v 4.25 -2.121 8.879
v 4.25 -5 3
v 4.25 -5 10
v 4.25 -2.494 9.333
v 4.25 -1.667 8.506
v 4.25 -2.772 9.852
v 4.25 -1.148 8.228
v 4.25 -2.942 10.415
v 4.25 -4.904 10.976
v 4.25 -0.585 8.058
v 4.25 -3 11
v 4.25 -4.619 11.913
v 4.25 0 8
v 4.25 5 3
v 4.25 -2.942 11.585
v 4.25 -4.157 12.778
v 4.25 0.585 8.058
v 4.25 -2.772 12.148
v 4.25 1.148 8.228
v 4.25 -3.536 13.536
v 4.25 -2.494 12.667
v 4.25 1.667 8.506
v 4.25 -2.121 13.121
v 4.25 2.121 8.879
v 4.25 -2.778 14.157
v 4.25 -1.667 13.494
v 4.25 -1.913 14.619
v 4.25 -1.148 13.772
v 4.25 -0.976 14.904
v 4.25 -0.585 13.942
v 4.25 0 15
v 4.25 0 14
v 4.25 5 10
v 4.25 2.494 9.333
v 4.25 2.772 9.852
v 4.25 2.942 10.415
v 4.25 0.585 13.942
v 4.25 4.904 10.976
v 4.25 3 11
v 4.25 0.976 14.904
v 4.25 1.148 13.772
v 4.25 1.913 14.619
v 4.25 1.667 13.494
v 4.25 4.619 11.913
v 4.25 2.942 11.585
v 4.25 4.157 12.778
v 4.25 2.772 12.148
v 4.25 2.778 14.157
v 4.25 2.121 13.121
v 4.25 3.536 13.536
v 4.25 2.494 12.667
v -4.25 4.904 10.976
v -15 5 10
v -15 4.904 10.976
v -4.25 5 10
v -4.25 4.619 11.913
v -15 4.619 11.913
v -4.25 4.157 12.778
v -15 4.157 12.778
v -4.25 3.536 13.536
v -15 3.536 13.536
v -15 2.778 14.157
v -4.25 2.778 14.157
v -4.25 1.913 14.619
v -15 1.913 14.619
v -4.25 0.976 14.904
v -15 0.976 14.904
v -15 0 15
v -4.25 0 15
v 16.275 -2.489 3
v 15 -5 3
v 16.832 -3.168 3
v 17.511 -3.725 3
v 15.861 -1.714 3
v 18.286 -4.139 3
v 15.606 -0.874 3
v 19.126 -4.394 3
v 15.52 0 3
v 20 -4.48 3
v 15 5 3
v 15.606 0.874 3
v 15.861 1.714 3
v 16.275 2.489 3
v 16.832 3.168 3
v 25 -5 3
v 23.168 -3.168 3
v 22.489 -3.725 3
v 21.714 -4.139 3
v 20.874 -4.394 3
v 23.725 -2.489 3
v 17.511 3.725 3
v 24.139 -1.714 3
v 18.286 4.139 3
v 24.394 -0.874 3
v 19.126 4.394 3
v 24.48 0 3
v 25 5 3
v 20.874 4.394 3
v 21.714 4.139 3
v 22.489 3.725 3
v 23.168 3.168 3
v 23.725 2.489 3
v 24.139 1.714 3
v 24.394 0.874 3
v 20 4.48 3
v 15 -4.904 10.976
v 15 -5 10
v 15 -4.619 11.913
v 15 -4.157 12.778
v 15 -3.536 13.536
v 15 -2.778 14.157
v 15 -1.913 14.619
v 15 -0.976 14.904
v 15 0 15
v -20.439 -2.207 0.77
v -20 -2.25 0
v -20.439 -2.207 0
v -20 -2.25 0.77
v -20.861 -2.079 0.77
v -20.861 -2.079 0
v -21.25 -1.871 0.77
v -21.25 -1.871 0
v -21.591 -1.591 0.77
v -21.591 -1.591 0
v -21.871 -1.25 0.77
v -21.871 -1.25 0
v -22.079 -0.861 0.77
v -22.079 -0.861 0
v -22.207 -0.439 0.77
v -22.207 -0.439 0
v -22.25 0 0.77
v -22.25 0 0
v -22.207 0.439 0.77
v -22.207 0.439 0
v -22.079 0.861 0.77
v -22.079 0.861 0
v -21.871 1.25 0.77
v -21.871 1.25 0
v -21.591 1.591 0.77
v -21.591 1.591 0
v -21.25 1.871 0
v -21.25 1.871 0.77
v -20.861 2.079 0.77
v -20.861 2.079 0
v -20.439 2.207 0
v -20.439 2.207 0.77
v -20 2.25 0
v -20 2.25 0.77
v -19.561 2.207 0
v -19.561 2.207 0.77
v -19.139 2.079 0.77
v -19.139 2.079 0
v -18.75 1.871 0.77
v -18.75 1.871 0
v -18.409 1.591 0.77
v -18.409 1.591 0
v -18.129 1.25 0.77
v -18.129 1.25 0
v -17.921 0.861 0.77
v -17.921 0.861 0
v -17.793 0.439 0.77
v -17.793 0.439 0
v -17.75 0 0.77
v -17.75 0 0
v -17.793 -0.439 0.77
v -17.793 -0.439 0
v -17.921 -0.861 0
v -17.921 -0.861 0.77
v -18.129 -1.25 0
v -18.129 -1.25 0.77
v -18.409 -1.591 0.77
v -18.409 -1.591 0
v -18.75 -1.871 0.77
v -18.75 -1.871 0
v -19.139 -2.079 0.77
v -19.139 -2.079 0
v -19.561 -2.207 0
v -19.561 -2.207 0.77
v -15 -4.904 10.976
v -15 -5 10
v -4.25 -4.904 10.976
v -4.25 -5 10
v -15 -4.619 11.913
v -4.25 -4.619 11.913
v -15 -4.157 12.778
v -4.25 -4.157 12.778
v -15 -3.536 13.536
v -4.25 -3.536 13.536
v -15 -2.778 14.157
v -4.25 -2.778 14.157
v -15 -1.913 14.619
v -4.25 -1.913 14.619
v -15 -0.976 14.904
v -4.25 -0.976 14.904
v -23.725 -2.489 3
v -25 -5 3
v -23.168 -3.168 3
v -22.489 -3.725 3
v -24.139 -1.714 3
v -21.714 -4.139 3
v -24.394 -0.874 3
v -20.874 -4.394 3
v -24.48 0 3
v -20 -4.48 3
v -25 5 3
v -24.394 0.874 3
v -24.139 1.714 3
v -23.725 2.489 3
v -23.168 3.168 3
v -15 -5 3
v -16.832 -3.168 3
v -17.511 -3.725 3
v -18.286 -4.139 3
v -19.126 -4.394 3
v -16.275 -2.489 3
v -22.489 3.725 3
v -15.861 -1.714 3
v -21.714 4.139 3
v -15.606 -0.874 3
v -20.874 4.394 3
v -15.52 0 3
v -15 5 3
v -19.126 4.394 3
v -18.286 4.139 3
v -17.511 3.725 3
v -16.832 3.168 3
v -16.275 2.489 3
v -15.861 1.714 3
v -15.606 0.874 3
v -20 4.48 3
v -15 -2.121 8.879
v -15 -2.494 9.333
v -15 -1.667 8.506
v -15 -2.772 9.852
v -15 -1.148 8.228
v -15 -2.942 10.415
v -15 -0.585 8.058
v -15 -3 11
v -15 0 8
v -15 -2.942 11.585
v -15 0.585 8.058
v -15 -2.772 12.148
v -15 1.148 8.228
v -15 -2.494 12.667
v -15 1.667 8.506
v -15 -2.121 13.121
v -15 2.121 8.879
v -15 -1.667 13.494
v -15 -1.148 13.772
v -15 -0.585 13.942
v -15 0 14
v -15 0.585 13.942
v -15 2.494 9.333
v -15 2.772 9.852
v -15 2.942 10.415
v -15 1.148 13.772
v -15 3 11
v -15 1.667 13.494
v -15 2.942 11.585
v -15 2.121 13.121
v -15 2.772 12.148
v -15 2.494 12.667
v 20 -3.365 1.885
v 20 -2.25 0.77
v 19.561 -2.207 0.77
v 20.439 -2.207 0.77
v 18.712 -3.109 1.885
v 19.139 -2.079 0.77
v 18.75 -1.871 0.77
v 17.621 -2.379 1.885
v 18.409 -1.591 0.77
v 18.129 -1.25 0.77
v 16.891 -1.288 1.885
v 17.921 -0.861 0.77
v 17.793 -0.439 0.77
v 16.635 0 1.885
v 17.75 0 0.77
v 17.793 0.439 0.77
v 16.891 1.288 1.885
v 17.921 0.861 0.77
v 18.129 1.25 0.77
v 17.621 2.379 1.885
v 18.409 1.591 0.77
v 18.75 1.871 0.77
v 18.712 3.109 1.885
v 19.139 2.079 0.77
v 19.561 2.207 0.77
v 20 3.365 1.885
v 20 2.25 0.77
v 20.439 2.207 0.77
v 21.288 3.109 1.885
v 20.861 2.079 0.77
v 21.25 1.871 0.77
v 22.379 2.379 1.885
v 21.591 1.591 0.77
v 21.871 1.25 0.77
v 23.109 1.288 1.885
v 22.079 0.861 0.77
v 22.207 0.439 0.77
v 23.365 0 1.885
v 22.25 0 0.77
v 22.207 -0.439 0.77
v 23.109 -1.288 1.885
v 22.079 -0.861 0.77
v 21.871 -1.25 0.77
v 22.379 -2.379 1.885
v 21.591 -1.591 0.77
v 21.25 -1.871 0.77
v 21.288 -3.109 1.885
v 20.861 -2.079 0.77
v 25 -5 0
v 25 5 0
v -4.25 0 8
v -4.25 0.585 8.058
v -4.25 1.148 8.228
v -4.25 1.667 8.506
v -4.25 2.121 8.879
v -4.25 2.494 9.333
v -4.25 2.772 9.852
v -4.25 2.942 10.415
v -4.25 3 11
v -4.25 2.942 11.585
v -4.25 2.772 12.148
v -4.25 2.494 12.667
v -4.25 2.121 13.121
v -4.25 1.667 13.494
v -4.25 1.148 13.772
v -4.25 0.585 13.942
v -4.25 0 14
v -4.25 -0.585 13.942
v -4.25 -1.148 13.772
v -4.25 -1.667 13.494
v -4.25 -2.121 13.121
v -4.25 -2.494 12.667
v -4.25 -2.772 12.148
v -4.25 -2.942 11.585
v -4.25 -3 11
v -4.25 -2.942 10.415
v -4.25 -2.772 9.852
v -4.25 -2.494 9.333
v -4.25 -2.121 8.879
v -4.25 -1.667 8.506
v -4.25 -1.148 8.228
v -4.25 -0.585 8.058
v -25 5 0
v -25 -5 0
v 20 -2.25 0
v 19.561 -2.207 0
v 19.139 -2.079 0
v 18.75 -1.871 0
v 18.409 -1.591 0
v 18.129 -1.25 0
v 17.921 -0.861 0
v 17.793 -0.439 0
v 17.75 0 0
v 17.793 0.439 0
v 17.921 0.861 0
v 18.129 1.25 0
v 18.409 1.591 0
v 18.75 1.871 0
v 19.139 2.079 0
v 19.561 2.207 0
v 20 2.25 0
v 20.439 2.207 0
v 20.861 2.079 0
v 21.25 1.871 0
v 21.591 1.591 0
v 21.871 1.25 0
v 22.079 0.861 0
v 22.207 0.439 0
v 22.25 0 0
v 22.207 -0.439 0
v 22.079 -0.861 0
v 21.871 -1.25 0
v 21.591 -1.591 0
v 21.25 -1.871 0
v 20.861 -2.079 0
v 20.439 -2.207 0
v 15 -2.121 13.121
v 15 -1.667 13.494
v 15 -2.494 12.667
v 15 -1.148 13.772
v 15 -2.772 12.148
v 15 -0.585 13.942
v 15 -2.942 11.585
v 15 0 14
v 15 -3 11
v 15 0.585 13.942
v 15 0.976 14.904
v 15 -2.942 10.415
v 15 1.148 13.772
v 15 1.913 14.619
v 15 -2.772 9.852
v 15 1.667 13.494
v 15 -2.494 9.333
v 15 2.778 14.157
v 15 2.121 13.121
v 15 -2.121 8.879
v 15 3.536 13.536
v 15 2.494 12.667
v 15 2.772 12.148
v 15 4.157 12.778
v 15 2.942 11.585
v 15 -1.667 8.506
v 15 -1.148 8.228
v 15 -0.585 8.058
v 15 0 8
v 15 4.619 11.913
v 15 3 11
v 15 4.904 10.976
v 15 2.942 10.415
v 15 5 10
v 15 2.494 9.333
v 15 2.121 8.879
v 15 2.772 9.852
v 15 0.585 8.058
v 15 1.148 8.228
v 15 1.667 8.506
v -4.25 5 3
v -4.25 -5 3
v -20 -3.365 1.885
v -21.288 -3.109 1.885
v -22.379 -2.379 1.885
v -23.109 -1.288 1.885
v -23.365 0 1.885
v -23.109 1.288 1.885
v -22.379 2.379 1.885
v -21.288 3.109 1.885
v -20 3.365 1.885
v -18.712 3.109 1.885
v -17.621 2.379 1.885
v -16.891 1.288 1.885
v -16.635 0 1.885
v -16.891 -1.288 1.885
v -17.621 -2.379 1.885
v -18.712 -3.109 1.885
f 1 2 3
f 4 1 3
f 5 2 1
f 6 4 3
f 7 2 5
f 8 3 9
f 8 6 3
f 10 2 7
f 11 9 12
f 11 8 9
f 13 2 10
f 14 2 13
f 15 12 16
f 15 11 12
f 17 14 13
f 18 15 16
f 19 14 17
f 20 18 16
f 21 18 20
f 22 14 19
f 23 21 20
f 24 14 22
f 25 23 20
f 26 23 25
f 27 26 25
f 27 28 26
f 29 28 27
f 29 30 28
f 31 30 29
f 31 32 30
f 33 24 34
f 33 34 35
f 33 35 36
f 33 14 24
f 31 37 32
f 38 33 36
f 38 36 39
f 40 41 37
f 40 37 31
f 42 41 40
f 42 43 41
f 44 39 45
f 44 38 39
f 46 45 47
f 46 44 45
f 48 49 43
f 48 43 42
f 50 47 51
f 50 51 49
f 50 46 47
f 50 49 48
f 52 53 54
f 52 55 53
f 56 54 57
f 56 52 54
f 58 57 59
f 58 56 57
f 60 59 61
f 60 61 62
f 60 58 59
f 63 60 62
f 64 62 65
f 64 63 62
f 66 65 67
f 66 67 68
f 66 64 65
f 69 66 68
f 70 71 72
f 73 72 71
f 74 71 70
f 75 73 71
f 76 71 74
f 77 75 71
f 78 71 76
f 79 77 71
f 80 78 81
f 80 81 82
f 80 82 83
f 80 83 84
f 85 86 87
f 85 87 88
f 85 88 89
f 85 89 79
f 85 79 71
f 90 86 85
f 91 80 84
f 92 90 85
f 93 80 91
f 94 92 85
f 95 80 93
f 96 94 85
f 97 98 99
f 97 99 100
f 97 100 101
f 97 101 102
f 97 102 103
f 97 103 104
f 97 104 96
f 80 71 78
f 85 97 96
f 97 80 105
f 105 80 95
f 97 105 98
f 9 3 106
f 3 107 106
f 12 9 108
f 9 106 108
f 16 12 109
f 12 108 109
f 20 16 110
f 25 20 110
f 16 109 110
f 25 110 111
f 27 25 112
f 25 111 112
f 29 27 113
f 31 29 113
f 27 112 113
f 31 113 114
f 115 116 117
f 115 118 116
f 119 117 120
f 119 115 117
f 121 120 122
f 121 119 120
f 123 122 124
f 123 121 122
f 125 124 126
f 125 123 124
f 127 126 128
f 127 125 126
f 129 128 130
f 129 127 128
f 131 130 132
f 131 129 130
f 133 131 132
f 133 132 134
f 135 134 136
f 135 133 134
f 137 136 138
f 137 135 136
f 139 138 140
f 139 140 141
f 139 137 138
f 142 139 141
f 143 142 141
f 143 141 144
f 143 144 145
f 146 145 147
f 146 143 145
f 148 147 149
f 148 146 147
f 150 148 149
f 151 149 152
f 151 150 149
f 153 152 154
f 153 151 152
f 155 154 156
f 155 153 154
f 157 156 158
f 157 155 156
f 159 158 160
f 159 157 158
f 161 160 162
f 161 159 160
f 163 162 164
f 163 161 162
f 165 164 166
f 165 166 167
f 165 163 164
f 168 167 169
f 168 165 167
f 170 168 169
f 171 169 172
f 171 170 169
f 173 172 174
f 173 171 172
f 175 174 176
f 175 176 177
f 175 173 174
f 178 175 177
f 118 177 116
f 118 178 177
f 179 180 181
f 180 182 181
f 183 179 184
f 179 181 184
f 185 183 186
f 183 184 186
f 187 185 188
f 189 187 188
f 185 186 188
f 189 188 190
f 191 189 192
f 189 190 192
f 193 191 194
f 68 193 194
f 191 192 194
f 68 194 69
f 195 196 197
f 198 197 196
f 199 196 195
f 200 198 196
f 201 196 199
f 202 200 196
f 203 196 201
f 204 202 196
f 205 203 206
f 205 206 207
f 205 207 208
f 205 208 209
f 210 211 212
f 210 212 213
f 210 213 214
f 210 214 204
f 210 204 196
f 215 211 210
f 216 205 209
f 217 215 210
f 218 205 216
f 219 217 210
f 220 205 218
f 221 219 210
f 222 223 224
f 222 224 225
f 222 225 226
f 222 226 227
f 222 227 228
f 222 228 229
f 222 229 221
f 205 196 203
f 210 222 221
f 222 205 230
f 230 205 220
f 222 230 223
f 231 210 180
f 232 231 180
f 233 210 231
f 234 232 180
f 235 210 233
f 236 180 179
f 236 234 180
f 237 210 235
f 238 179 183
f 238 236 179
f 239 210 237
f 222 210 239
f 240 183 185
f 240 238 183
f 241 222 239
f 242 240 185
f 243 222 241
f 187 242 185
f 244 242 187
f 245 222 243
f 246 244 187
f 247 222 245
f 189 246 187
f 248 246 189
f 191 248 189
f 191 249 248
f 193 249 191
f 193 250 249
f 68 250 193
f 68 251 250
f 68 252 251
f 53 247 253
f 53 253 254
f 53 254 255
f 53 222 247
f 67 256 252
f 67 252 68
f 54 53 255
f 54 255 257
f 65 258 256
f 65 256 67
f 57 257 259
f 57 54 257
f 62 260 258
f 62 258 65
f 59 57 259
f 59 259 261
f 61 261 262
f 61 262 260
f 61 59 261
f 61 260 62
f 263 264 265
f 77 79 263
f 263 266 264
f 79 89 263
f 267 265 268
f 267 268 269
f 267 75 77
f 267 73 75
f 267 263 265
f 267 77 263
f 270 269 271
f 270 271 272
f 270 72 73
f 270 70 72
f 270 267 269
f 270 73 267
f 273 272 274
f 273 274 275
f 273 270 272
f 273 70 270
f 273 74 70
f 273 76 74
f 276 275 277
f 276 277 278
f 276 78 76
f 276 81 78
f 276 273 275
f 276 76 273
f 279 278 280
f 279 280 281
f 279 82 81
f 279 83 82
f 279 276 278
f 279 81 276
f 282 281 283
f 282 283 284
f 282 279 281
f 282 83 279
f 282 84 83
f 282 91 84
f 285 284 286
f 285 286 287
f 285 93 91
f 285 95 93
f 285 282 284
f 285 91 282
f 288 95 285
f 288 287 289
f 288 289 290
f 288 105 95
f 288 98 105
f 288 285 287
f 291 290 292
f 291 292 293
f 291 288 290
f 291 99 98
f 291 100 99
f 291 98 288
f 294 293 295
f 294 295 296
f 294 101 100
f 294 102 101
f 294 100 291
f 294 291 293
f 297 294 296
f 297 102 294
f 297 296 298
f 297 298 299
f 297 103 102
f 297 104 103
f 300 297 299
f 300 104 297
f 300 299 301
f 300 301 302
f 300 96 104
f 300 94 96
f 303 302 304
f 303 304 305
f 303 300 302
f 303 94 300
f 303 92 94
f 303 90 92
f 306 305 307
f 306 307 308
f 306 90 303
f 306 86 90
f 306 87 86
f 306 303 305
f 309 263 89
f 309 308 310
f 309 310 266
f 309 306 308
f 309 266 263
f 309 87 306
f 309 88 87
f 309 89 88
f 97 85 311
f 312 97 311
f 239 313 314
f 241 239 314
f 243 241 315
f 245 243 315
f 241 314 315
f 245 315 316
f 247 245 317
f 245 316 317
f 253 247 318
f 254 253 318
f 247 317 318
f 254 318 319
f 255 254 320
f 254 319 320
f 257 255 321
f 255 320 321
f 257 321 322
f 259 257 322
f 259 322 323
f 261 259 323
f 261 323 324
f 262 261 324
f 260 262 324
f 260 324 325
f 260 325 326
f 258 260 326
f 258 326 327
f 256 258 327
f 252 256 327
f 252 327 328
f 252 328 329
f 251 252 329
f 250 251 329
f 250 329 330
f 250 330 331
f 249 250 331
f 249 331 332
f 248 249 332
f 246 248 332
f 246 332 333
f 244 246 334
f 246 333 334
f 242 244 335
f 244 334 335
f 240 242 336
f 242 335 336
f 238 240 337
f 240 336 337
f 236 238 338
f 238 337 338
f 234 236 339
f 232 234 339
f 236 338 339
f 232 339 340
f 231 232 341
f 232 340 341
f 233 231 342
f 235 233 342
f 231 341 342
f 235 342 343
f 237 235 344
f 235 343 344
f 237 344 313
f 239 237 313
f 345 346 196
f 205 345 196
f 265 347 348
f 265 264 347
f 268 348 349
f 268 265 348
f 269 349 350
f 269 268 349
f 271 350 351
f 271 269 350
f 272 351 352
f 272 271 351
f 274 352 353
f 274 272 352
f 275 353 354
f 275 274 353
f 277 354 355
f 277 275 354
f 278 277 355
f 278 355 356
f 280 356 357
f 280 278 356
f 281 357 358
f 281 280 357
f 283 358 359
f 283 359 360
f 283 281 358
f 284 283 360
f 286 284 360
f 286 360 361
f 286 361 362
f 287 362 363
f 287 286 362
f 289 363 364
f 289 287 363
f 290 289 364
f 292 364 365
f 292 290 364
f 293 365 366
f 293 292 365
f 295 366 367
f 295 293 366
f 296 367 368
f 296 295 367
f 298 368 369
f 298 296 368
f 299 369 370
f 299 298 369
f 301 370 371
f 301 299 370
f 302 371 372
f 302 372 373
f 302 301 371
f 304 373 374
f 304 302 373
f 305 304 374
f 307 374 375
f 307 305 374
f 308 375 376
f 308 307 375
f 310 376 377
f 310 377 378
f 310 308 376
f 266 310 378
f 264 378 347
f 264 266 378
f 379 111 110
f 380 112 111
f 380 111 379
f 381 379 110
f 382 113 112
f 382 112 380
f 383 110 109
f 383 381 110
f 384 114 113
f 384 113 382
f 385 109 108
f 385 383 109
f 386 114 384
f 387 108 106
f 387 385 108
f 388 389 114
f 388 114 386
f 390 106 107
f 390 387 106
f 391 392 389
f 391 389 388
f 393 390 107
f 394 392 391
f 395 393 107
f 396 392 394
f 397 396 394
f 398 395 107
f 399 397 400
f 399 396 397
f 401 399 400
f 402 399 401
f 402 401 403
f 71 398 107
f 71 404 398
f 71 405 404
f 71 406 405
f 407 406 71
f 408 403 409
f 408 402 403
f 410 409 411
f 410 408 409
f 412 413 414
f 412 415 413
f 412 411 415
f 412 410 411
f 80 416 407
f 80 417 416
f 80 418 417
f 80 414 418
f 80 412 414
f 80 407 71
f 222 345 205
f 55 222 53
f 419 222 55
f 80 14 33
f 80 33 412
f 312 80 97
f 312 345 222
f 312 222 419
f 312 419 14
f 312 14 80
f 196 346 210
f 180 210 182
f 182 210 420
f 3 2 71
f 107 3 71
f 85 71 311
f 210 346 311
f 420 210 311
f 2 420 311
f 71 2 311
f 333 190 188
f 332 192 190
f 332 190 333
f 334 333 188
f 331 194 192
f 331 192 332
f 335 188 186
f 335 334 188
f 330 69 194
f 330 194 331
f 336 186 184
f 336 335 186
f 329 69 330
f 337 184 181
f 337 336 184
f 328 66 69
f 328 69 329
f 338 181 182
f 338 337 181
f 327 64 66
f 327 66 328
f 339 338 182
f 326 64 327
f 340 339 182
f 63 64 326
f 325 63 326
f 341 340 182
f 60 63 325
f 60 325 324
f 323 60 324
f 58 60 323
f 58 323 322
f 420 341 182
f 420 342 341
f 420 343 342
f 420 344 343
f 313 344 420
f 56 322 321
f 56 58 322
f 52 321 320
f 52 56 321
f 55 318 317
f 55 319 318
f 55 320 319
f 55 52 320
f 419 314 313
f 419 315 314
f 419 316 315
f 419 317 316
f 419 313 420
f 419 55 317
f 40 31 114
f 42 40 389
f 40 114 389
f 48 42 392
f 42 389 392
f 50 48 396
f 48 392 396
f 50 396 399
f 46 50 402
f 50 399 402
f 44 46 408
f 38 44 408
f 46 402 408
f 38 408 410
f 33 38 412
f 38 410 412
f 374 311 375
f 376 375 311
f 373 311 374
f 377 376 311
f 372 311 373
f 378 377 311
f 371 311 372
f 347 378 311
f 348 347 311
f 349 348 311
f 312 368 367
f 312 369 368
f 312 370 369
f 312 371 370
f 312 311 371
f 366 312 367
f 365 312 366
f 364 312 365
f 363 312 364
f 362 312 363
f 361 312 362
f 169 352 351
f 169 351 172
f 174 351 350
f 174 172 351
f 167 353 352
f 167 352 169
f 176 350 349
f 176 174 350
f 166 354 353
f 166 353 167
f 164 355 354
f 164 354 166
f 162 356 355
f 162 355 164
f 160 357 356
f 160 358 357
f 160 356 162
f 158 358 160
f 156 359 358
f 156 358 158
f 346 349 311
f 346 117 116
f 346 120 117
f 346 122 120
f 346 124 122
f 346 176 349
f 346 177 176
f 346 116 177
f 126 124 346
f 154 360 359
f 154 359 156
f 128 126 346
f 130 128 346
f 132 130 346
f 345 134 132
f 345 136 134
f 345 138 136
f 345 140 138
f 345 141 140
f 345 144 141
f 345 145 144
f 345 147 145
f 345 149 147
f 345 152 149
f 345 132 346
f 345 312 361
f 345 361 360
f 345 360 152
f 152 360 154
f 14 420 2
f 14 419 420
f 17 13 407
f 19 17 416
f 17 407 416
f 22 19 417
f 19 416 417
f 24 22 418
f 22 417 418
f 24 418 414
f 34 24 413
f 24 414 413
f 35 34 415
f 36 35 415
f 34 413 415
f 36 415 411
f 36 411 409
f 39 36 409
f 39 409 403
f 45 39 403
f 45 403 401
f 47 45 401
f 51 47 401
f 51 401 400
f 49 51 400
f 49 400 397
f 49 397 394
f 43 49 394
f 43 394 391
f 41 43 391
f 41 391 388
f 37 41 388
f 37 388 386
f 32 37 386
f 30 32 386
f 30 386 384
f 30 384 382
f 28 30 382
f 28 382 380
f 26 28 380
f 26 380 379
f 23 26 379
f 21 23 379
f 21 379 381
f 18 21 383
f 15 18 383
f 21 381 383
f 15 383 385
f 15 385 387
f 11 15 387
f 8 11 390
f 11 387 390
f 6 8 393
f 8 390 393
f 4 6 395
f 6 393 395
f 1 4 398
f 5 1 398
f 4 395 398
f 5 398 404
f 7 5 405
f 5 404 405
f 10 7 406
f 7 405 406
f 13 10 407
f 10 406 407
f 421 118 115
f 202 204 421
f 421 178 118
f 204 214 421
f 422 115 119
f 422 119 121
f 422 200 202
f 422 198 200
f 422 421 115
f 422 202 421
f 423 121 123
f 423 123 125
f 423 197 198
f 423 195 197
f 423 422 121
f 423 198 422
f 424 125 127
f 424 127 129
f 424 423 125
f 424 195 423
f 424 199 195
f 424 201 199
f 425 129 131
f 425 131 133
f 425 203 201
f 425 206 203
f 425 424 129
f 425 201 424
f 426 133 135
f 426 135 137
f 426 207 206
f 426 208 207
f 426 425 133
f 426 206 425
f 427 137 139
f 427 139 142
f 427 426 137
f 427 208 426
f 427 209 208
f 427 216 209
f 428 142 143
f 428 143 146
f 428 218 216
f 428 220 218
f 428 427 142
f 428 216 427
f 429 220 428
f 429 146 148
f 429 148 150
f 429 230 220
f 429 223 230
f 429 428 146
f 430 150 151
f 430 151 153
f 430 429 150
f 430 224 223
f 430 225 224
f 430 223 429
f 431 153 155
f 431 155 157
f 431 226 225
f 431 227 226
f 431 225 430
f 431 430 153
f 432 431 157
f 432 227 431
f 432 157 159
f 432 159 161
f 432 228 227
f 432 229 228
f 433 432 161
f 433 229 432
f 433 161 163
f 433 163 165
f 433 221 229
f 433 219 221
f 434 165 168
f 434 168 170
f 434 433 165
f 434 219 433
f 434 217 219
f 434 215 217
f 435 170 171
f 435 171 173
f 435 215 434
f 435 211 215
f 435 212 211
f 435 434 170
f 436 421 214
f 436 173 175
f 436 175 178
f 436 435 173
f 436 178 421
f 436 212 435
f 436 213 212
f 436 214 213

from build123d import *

# Parameters (mm, degrees)
EXTRUDE_1_DEPTH             = 5
HOLE_WIZARD_M4_1_AT_2_COUNT = 2
HOLE_WIZARD_M4_1_AT_2_PITCH = 40
SKETCH_3_R                  = 3
CUT_EXTRUDE_2_DEPTH         = 44.011626335
FILLET_1_R                  = 5


with BuildPart() as part:
    # 草图1 → 拉伸1 (new, symmetric)
    with BuildSketch(Plane(origin=(0, 0, 0), x_dir=(1, 0, 0), z_dir=(0, 1, 0))):
        Polygon((4.25, -3), (4.25, -15), (15, -15), (15, -3), (25, -3), (25, 0), (-25, 0), (-25, -3), (-15, -3), (-15, -15), (-4.25, -15), (-4.25, -3), align=None)
    extrude(amount=EXTRUDE_1_DEPTH, both=True)

    # 草图2 → M4 六角凹锥坑螺钉的锥形沉头孔1 (revolve, cut)
    with BuildSketch(Plane(origin=(-20, 0, 3), x_dir=(0, -1, 0), z_dir=(1, 0, 0))):
        Polygon((0, 0), (0, 3), (2.25, 3), (2.25, 2.23), (4.48, 0), align=None)
    hole_wizard_m4_1 = revolve(axis=Axis((-20, 0, 9.35), (0, 0, -1)), mode=Mode.SUBTRACT)

    # M4 六角凹锥坑螺钉的锥形沉头孔1 at 2: M4 六角凹锥坑螺钉的锥形沉头孔1 ×2
    with Locations(*[(i * HOLE_WIZARD_M4_1_AT_2_PITCH, 0, 0) for i in range(1, HOLE_WIZARD_M4_1_AT_2_COUNT)]):
        add(hole_wizard_m4_1, mode=Mode.SUBTRACT)

    # 草图3 → 拉伸2 (cut, through all)
    with BuildSketch(Plane(origin=(15, 0, 0), x_dir=(0, 0, -1), z_dir=(1, 0, 0))):
        with Locations((-11, 0)):
            Circle(SKETCH_3_R)
    extrude(amount=-CUT_EXTRUDE_2_DEPTH, mode=Mode.SUBTRACT)

    # 圆角1
    fillet_1_edges = [part.edges().sort_by_distance(p)[0] for p in [
        (-9.625, -5, 15),
        (9.625, -5, 15),
        (9.625, 5, 15),
        (-9.625, 5, 15),
    ]]
    fillet(fillet_1_edges, radius=FILLET_1_R - 0.0001)  # a hair under: the kernel refuses the full size


solid = part.part
